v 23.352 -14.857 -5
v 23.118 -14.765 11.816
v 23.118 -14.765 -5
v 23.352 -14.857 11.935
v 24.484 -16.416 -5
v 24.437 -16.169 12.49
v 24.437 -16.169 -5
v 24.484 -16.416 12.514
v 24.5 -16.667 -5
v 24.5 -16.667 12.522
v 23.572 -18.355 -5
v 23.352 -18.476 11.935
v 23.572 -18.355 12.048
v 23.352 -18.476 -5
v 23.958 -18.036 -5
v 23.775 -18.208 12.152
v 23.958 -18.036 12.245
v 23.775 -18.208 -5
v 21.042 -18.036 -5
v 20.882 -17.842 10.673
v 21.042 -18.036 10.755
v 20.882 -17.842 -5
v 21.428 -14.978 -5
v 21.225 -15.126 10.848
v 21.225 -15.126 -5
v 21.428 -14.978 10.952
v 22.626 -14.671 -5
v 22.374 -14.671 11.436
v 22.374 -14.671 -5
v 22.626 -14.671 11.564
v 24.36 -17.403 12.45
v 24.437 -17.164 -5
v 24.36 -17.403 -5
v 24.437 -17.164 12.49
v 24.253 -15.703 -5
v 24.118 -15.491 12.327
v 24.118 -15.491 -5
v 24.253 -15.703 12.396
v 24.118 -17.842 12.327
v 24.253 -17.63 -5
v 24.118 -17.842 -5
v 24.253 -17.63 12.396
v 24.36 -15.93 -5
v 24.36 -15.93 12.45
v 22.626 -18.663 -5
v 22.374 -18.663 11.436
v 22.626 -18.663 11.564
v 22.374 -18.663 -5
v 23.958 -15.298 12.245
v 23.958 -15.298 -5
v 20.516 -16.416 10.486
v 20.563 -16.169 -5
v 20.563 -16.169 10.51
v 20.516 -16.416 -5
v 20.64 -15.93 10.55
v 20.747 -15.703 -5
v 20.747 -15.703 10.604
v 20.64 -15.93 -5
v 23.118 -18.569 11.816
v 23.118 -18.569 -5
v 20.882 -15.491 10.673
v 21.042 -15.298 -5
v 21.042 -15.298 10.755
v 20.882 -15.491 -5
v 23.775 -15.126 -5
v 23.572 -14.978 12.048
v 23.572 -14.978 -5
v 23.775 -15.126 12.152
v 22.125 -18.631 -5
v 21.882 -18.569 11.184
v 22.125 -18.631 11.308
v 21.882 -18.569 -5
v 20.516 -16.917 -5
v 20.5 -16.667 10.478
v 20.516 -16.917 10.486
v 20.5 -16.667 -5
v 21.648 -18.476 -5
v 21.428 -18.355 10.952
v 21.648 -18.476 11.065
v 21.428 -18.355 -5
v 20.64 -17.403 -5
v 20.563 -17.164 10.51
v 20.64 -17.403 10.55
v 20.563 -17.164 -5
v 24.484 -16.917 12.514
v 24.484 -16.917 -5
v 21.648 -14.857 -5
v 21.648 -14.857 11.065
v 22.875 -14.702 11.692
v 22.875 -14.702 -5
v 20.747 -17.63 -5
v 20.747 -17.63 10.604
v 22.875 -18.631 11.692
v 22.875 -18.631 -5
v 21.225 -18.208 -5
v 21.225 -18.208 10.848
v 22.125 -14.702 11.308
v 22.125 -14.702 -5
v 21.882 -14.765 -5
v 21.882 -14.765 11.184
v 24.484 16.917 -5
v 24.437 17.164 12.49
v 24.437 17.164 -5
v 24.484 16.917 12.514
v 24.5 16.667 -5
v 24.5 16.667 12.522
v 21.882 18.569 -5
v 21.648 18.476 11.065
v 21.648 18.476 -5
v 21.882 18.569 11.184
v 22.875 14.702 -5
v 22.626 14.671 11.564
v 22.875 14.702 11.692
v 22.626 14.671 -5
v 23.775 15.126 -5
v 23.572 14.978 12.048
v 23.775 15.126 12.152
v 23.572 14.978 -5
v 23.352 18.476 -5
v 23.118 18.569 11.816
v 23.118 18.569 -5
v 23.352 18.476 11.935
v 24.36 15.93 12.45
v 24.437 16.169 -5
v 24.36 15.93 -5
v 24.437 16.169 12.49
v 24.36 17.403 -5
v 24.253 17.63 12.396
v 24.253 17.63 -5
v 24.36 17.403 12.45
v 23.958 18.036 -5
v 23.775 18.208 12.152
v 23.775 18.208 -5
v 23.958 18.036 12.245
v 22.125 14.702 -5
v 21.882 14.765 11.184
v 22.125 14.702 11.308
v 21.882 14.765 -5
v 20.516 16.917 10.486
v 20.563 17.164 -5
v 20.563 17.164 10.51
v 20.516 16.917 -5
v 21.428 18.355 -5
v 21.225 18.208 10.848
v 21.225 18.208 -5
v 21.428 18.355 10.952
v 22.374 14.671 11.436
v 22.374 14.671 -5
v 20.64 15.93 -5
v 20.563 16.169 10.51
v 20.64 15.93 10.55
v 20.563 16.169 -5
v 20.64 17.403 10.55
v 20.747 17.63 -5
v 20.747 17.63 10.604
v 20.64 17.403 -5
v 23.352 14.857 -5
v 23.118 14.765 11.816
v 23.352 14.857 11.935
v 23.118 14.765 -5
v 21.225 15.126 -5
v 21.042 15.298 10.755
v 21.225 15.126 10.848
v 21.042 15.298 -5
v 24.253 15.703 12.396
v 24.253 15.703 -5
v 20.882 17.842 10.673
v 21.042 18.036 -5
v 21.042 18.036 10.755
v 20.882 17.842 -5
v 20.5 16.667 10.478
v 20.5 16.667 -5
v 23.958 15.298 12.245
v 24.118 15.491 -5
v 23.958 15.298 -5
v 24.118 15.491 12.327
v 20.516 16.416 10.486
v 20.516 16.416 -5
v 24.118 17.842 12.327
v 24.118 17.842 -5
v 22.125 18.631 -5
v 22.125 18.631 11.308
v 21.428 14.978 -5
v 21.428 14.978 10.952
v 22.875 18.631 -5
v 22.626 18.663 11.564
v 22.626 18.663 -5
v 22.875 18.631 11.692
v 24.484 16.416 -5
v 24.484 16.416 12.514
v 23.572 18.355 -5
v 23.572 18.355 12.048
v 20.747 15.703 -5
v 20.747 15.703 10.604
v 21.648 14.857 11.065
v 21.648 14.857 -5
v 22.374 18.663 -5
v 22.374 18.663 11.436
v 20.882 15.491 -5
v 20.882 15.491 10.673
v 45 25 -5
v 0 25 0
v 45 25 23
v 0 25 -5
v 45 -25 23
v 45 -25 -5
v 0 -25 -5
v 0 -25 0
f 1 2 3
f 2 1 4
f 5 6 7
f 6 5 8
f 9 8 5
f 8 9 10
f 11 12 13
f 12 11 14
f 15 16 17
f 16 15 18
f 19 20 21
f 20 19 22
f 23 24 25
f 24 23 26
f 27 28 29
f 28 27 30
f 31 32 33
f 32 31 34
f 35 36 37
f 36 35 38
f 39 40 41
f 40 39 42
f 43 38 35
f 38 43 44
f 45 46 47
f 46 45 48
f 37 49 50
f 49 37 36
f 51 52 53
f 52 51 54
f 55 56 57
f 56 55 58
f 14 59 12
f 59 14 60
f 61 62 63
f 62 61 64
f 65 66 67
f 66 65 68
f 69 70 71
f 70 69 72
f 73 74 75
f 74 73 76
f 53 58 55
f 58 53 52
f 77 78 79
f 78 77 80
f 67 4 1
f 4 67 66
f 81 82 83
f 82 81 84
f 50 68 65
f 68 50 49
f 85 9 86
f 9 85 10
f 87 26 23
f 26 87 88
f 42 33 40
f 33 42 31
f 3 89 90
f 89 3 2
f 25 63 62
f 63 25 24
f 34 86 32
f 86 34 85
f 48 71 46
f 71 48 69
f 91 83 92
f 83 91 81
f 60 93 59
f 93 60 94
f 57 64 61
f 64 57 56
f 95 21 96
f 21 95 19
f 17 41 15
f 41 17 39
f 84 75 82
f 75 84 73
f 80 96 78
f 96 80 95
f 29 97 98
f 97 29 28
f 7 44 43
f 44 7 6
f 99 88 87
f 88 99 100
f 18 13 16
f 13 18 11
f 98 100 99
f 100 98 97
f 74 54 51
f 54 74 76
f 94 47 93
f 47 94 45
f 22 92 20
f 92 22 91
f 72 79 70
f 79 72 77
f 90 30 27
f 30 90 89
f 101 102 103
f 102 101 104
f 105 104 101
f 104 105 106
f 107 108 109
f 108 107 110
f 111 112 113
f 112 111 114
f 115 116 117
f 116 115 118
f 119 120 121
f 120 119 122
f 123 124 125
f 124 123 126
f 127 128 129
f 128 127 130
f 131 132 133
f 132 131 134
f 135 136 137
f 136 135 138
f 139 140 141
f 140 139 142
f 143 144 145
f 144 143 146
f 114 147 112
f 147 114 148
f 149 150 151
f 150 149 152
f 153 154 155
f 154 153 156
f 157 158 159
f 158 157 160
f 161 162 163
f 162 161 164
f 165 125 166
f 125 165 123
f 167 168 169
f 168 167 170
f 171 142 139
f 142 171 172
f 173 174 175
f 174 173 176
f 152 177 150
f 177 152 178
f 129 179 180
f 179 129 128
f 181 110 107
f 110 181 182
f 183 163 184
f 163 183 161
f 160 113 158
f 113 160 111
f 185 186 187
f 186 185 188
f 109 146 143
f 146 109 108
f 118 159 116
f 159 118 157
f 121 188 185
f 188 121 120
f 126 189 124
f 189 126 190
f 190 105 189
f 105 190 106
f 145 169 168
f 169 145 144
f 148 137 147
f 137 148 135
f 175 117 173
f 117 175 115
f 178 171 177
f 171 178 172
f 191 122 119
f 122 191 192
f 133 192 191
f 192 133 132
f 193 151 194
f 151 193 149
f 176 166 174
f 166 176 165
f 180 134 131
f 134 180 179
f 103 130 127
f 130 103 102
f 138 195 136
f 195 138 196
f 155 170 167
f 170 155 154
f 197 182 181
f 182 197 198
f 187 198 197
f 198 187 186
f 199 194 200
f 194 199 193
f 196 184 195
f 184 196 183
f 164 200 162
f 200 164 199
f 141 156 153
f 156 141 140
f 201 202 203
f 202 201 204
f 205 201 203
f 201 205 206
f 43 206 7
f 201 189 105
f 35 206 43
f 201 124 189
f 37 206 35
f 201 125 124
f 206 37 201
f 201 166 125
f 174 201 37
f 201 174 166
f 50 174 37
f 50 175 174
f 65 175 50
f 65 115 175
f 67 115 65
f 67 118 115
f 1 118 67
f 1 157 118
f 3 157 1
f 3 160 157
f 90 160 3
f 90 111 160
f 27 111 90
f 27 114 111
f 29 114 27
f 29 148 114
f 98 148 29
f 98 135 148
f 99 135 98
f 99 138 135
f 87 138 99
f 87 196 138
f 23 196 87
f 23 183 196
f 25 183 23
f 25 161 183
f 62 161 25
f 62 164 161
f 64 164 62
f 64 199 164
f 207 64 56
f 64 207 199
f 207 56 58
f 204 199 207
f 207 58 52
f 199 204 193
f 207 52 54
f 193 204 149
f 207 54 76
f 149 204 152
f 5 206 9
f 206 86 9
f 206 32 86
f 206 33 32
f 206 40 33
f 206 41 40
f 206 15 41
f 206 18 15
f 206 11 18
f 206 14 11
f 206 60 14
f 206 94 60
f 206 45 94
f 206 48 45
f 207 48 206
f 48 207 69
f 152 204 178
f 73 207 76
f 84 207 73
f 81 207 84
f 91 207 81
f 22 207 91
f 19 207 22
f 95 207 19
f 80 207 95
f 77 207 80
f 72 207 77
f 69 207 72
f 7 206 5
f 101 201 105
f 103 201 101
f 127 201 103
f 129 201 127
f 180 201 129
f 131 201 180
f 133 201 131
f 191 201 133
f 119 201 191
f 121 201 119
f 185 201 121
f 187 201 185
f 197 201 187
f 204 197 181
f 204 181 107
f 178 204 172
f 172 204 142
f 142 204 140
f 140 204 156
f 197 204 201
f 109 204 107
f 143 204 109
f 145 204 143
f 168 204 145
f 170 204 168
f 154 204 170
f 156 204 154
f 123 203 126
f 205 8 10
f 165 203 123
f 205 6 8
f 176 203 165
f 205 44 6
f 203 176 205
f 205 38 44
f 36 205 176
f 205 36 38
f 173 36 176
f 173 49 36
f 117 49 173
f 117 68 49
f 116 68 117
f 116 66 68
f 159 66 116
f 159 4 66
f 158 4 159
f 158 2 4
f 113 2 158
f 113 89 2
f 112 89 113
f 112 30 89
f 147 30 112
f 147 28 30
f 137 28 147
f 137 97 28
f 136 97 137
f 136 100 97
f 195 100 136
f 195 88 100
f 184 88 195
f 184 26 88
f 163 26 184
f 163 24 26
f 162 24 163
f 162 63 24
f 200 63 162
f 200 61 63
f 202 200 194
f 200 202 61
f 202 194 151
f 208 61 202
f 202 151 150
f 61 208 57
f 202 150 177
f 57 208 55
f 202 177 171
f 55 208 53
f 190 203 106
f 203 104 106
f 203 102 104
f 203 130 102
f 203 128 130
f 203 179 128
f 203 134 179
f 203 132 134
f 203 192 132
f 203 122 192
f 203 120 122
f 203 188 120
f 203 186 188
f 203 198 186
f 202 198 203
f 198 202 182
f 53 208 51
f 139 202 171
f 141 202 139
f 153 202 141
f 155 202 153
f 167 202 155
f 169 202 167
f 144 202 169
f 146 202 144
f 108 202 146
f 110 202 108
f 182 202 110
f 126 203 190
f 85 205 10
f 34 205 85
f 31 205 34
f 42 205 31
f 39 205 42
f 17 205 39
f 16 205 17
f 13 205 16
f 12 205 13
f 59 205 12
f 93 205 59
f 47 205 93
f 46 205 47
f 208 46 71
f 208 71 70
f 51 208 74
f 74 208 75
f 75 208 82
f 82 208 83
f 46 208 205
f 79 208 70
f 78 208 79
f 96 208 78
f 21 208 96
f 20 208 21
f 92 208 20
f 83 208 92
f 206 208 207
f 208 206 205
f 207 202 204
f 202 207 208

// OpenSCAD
length=50;
$fn=50;

difference(){ 
  rotate([90,0,0]) linear_extrude(length,center=true) polygon([[0,0],[0,-5],[45,-5],[45,23]]);
  for (iy=[-1,1])
    translate([45/2,iy*length/3,-5.1]) cylinder(d=4,h=25);
}
